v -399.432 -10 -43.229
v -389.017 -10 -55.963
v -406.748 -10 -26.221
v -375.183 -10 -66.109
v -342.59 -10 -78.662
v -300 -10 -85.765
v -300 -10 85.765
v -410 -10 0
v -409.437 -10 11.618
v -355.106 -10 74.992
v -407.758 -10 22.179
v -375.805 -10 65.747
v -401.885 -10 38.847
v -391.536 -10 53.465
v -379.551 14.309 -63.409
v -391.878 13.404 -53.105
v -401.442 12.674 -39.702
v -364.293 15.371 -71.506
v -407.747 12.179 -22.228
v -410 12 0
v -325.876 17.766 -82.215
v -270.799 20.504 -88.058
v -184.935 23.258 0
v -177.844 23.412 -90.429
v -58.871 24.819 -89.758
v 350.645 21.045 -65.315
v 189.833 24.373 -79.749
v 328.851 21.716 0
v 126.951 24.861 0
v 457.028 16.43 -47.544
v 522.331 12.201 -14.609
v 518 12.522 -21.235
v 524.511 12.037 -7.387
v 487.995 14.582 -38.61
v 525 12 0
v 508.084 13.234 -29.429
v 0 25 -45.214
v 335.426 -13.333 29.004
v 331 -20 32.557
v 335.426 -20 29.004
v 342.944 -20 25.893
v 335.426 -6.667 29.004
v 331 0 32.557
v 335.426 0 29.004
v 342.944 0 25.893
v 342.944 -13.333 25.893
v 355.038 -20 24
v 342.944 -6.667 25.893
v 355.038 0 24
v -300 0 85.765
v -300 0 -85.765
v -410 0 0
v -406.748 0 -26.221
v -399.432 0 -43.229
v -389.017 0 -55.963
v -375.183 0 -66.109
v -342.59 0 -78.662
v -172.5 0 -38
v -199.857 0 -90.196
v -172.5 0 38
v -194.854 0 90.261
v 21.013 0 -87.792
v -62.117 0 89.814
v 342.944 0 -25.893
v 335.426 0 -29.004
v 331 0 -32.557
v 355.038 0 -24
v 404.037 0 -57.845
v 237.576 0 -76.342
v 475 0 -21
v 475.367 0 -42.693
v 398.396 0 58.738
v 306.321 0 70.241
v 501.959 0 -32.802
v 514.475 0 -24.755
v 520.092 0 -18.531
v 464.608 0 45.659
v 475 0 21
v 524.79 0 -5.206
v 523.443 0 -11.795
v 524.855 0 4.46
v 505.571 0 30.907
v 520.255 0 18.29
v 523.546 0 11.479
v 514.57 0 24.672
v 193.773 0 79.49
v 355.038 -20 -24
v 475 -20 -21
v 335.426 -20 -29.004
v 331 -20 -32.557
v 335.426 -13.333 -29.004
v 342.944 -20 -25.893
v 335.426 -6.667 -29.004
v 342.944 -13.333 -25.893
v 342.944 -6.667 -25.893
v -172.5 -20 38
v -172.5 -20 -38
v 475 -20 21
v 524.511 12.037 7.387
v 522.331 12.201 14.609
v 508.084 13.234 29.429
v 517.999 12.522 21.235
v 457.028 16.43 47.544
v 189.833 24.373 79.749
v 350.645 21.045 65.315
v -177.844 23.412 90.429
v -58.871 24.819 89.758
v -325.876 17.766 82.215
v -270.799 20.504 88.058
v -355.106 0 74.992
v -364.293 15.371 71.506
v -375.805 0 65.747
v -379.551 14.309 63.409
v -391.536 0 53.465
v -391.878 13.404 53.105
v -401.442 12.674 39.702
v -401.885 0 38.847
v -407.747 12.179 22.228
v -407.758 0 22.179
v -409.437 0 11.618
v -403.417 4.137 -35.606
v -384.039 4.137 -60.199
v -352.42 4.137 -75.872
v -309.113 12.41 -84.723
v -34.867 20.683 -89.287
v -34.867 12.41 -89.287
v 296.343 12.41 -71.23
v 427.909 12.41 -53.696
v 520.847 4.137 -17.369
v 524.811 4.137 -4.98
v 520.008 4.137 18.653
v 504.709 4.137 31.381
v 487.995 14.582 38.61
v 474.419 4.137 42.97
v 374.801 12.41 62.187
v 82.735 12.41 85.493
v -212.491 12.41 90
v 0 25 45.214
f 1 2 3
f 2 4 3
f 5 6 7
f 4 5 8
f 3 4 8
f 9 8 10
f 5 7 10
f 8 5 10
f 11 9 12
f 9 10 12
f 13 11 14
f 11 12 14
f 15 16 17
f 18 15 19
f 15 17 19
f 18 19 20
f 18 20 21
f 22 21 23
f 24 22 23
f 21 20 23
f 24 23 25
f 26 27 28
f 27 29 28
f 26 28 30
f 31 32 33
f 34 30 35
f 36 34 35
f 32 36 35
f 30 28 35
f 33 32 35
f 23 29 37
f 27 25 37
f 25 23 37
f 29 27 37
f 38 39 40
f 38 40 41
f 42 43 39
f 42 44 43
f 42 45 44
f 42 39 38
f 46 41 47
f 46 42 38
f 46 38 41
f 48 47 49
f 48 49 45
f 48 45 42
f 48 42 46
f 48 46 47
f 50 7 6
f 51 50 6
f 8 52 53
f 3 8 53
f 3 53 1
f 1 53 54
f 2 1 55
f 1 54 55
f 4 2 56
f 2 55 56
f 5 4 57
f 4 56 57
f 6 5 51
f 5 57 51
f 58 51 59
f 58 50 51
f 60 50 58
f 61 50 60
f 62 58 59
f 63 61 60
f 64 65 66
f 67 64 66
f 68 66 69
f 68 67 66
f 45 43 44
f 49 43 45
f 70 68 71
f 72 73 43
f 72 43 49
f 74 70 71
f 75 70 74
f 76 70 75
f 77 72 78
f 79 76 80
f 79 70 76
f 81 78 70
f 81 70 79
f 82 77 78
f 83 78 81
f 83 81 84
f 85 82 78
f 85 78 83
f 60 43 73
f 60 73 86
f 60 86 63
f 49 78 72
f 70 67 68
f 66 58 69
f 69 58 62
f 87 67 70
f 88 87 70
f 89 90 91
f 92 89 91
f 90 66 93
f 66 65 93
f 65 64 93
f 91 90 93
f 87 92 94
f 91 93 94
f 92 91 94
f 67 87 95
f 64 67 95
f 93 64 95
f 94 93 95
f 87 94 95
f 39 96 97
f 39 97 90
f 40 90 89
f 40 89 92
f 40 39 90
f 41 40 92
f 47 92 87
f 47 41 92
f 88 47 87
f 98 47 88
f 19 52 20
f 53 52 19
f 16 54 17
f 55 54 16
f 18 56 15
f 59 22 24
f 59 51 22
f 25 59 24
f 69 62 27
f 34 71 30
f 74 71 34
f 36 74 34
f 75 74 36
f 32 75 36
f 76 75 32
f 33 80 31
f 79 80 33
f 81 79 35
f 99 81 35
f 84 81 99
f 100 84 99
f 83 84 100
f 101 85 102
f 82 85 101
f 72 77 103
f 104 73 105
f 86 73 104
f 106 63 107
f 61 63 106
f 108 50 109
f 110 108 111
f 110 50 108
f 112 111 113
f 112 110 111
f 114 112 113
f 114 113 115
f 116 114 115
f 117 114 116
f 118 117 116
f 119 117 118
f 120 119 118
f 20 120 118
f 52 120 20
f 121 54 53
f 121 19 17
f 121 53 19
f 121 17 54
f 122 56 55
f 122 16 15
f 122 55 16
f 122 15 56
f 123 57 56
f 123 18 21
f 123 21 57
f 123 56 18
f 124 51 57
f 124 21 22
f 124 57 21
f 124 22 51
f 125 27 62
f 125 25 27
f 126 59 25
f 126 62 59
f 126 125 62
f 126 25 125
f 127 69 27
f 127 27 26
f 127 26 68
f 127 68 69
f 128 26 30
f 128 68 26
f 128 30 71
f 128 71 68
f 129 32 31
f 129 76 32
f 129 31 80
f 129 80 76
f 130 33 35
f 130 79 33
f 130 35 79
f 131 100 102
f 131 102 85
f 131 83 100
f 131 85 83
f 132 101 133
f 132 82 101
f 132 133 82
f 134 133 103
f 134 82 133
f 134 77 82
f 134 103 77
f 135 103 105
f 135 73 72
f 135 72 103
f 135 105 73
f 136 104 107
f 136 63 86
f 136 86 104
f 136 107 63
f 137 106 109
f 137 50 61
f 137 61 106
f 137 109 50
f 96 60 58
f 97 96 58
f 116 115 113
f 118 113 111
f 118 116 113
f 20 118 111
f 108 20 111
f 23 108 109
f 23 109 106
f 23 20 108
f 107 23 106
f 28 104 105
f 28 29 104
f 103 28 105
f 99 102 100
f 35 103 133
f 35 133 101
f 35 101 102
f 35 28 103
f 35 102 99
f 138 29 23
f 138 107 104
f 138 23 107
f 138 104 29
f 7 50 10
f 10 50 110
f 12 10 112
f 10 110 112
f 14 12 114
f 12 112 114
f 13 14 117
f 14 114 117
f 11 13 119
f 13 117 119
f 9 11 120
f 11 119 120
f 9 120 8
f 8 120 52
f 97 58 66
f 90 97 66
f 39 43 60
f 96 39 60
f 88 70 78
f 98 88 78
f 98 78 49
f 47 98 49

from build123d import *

# Parameters (mm, degrees)
F1_DEPTH = 30
F3_DEPTH = 500
F4_DEPTH = 10
F6_DEPTH = 10
F8_DEPTH = 20


with BuildPart() as f1:
    # F0 (on Front) → F1 (new body)
    with BuildSketch(Plane.XZ):
        with BuildLine():
            add(Edge.make_bspline(
                [(-410, 0), (-410, 78.9728224141), (-208.2785468634, 103.8873472484), (519.8811059336, 72.0494995737), (525, 8.5435118526), (525, 0)],
                knots=[0, 0, 0, 0, 0.3099569307, 0.8752208997, 1, 1, 1, 1], degree=3))
            add(Edge.make_bspline(
                [(-410, 0), (-410, -78.9728224141), (-208.2785468634, -103.8873472484), (519.8811059336, -72.0494995737), (525, -8.5435118526), (525, 0)],
                knots=[0, 0, 0, 0, 0.3099569307, 0.8752208997, 1, 1, 1, 1], degree=3))
        make_face()
    extrude(amount=-F1_DEPTH)

    # F2 (on Top) → F3 (cut, symmetric)
    with BuildSketch(Plane.XY):
        with BuildLine():
            Line((-410, 37), (-410, 12))
            add(Edge.make_bspline(
                [(-410, 12), (-263.8749145203, 23.6716755717), (-9.5554071198, 25.9518235524), (359.4458289348, 24.5466398239), (525, 12)],
                knots=[0, 0, 0, 0, 0.4691585594, 1, 1, 1, 1], degree=3))
            Line((525, 12), (545, 12))
            Line((545, 12), (545, 37))
            Line((545, 37), (-410, 37))
        make_face()
    extrude(amount=F3_DEPTH, both=True, mode=Mode.SUBTRACT)

    # F0 (on Front) → F4 (join)
    with BuildSketch(Plane.XZ):
        with BuildLine():
            add(Edge.make_bspline(
                [(-410, 0), (-410, 78.9728224141), (-208.2785468634, 103.8873472484), (519.8811059336, 72.0494995737), (525, 8.5435118526), (525, 0)],
                knots=[0, 0, 0, 0, 0.3099569307, 0.8752208997, 1, 1, 1, 1], degree=3))
            add(Edge.make_bspline(
                [(-410, 0), (-410, -78.9728224141), (-208.2785468634, -103.8873472484), (519.8811059336, -72.0494995737), (525, -8.5435118526), (525, 0)],
                knots=[0, 0, 0, 0, 0.3099569307, 0.8752208997, 1, 1, 1, 1], degree=3))
        make_face()
    extrude(amount=F4_DEPTH)

    # F5 (on face) → F6 (cut)
    with BuildSketch(Plane.XZ.offset(10)):
        Polygon((-300, 140.8456638455), (-300, 85.7651611453), (-300, -85.7651611453), (-300, -122.7003704771), (-300, -145.7490250468), (565.5409514904, -145.7490250468), (565.5409514904, 140.8456638455), align=None)
    extrude(amount=-F6_DEPTH, mode=Mode.SUBTRACT)

    # F7 (on face) → F8 (join)
    with BuildSketch(Plane.XZ):
        with BuildLine():
            Line((-172.5, 38), (-172.5, 0))
            Line((-172.5, 0), (-172.5, -38))
            Line((-172.5, -38), (331, -32.5567567568))
            add(Edge.make_bspline(
                [(331, -32.5567567568), (334.3753516674, -29.0429461747), (340.1614382228, -25.0244268924), (355.0375058612, -24)],
                knots=[0, 0, 0, 0, 25.5150891478, 25.5150891478, 25.5150891478, 25.5150891478], degree=3))
            Line((355.0375058612, -24), (475, -21))
            Line((475, -21), (475, 0))
            Line((475, 0), (475, 21))
            Line((475, 21), (355.0375058612, 24))
            add(Edge.make_bspline(
                [(331, 32.5567567568), (334.3753516674, 29.0429461747), (340.1614382228, 25.0244268924), (355.0375058612, 24)],
                knots=[0, 0, 0, 0, 25.5150891478, 25.5150891478, 25.5150891478, 25.5150891478], degree=3))
            Line((331, 32.5567567568), (-172.5, 38))
        make_face()
    extrude(amount=F8_DEPTH)


solid = f1.part
